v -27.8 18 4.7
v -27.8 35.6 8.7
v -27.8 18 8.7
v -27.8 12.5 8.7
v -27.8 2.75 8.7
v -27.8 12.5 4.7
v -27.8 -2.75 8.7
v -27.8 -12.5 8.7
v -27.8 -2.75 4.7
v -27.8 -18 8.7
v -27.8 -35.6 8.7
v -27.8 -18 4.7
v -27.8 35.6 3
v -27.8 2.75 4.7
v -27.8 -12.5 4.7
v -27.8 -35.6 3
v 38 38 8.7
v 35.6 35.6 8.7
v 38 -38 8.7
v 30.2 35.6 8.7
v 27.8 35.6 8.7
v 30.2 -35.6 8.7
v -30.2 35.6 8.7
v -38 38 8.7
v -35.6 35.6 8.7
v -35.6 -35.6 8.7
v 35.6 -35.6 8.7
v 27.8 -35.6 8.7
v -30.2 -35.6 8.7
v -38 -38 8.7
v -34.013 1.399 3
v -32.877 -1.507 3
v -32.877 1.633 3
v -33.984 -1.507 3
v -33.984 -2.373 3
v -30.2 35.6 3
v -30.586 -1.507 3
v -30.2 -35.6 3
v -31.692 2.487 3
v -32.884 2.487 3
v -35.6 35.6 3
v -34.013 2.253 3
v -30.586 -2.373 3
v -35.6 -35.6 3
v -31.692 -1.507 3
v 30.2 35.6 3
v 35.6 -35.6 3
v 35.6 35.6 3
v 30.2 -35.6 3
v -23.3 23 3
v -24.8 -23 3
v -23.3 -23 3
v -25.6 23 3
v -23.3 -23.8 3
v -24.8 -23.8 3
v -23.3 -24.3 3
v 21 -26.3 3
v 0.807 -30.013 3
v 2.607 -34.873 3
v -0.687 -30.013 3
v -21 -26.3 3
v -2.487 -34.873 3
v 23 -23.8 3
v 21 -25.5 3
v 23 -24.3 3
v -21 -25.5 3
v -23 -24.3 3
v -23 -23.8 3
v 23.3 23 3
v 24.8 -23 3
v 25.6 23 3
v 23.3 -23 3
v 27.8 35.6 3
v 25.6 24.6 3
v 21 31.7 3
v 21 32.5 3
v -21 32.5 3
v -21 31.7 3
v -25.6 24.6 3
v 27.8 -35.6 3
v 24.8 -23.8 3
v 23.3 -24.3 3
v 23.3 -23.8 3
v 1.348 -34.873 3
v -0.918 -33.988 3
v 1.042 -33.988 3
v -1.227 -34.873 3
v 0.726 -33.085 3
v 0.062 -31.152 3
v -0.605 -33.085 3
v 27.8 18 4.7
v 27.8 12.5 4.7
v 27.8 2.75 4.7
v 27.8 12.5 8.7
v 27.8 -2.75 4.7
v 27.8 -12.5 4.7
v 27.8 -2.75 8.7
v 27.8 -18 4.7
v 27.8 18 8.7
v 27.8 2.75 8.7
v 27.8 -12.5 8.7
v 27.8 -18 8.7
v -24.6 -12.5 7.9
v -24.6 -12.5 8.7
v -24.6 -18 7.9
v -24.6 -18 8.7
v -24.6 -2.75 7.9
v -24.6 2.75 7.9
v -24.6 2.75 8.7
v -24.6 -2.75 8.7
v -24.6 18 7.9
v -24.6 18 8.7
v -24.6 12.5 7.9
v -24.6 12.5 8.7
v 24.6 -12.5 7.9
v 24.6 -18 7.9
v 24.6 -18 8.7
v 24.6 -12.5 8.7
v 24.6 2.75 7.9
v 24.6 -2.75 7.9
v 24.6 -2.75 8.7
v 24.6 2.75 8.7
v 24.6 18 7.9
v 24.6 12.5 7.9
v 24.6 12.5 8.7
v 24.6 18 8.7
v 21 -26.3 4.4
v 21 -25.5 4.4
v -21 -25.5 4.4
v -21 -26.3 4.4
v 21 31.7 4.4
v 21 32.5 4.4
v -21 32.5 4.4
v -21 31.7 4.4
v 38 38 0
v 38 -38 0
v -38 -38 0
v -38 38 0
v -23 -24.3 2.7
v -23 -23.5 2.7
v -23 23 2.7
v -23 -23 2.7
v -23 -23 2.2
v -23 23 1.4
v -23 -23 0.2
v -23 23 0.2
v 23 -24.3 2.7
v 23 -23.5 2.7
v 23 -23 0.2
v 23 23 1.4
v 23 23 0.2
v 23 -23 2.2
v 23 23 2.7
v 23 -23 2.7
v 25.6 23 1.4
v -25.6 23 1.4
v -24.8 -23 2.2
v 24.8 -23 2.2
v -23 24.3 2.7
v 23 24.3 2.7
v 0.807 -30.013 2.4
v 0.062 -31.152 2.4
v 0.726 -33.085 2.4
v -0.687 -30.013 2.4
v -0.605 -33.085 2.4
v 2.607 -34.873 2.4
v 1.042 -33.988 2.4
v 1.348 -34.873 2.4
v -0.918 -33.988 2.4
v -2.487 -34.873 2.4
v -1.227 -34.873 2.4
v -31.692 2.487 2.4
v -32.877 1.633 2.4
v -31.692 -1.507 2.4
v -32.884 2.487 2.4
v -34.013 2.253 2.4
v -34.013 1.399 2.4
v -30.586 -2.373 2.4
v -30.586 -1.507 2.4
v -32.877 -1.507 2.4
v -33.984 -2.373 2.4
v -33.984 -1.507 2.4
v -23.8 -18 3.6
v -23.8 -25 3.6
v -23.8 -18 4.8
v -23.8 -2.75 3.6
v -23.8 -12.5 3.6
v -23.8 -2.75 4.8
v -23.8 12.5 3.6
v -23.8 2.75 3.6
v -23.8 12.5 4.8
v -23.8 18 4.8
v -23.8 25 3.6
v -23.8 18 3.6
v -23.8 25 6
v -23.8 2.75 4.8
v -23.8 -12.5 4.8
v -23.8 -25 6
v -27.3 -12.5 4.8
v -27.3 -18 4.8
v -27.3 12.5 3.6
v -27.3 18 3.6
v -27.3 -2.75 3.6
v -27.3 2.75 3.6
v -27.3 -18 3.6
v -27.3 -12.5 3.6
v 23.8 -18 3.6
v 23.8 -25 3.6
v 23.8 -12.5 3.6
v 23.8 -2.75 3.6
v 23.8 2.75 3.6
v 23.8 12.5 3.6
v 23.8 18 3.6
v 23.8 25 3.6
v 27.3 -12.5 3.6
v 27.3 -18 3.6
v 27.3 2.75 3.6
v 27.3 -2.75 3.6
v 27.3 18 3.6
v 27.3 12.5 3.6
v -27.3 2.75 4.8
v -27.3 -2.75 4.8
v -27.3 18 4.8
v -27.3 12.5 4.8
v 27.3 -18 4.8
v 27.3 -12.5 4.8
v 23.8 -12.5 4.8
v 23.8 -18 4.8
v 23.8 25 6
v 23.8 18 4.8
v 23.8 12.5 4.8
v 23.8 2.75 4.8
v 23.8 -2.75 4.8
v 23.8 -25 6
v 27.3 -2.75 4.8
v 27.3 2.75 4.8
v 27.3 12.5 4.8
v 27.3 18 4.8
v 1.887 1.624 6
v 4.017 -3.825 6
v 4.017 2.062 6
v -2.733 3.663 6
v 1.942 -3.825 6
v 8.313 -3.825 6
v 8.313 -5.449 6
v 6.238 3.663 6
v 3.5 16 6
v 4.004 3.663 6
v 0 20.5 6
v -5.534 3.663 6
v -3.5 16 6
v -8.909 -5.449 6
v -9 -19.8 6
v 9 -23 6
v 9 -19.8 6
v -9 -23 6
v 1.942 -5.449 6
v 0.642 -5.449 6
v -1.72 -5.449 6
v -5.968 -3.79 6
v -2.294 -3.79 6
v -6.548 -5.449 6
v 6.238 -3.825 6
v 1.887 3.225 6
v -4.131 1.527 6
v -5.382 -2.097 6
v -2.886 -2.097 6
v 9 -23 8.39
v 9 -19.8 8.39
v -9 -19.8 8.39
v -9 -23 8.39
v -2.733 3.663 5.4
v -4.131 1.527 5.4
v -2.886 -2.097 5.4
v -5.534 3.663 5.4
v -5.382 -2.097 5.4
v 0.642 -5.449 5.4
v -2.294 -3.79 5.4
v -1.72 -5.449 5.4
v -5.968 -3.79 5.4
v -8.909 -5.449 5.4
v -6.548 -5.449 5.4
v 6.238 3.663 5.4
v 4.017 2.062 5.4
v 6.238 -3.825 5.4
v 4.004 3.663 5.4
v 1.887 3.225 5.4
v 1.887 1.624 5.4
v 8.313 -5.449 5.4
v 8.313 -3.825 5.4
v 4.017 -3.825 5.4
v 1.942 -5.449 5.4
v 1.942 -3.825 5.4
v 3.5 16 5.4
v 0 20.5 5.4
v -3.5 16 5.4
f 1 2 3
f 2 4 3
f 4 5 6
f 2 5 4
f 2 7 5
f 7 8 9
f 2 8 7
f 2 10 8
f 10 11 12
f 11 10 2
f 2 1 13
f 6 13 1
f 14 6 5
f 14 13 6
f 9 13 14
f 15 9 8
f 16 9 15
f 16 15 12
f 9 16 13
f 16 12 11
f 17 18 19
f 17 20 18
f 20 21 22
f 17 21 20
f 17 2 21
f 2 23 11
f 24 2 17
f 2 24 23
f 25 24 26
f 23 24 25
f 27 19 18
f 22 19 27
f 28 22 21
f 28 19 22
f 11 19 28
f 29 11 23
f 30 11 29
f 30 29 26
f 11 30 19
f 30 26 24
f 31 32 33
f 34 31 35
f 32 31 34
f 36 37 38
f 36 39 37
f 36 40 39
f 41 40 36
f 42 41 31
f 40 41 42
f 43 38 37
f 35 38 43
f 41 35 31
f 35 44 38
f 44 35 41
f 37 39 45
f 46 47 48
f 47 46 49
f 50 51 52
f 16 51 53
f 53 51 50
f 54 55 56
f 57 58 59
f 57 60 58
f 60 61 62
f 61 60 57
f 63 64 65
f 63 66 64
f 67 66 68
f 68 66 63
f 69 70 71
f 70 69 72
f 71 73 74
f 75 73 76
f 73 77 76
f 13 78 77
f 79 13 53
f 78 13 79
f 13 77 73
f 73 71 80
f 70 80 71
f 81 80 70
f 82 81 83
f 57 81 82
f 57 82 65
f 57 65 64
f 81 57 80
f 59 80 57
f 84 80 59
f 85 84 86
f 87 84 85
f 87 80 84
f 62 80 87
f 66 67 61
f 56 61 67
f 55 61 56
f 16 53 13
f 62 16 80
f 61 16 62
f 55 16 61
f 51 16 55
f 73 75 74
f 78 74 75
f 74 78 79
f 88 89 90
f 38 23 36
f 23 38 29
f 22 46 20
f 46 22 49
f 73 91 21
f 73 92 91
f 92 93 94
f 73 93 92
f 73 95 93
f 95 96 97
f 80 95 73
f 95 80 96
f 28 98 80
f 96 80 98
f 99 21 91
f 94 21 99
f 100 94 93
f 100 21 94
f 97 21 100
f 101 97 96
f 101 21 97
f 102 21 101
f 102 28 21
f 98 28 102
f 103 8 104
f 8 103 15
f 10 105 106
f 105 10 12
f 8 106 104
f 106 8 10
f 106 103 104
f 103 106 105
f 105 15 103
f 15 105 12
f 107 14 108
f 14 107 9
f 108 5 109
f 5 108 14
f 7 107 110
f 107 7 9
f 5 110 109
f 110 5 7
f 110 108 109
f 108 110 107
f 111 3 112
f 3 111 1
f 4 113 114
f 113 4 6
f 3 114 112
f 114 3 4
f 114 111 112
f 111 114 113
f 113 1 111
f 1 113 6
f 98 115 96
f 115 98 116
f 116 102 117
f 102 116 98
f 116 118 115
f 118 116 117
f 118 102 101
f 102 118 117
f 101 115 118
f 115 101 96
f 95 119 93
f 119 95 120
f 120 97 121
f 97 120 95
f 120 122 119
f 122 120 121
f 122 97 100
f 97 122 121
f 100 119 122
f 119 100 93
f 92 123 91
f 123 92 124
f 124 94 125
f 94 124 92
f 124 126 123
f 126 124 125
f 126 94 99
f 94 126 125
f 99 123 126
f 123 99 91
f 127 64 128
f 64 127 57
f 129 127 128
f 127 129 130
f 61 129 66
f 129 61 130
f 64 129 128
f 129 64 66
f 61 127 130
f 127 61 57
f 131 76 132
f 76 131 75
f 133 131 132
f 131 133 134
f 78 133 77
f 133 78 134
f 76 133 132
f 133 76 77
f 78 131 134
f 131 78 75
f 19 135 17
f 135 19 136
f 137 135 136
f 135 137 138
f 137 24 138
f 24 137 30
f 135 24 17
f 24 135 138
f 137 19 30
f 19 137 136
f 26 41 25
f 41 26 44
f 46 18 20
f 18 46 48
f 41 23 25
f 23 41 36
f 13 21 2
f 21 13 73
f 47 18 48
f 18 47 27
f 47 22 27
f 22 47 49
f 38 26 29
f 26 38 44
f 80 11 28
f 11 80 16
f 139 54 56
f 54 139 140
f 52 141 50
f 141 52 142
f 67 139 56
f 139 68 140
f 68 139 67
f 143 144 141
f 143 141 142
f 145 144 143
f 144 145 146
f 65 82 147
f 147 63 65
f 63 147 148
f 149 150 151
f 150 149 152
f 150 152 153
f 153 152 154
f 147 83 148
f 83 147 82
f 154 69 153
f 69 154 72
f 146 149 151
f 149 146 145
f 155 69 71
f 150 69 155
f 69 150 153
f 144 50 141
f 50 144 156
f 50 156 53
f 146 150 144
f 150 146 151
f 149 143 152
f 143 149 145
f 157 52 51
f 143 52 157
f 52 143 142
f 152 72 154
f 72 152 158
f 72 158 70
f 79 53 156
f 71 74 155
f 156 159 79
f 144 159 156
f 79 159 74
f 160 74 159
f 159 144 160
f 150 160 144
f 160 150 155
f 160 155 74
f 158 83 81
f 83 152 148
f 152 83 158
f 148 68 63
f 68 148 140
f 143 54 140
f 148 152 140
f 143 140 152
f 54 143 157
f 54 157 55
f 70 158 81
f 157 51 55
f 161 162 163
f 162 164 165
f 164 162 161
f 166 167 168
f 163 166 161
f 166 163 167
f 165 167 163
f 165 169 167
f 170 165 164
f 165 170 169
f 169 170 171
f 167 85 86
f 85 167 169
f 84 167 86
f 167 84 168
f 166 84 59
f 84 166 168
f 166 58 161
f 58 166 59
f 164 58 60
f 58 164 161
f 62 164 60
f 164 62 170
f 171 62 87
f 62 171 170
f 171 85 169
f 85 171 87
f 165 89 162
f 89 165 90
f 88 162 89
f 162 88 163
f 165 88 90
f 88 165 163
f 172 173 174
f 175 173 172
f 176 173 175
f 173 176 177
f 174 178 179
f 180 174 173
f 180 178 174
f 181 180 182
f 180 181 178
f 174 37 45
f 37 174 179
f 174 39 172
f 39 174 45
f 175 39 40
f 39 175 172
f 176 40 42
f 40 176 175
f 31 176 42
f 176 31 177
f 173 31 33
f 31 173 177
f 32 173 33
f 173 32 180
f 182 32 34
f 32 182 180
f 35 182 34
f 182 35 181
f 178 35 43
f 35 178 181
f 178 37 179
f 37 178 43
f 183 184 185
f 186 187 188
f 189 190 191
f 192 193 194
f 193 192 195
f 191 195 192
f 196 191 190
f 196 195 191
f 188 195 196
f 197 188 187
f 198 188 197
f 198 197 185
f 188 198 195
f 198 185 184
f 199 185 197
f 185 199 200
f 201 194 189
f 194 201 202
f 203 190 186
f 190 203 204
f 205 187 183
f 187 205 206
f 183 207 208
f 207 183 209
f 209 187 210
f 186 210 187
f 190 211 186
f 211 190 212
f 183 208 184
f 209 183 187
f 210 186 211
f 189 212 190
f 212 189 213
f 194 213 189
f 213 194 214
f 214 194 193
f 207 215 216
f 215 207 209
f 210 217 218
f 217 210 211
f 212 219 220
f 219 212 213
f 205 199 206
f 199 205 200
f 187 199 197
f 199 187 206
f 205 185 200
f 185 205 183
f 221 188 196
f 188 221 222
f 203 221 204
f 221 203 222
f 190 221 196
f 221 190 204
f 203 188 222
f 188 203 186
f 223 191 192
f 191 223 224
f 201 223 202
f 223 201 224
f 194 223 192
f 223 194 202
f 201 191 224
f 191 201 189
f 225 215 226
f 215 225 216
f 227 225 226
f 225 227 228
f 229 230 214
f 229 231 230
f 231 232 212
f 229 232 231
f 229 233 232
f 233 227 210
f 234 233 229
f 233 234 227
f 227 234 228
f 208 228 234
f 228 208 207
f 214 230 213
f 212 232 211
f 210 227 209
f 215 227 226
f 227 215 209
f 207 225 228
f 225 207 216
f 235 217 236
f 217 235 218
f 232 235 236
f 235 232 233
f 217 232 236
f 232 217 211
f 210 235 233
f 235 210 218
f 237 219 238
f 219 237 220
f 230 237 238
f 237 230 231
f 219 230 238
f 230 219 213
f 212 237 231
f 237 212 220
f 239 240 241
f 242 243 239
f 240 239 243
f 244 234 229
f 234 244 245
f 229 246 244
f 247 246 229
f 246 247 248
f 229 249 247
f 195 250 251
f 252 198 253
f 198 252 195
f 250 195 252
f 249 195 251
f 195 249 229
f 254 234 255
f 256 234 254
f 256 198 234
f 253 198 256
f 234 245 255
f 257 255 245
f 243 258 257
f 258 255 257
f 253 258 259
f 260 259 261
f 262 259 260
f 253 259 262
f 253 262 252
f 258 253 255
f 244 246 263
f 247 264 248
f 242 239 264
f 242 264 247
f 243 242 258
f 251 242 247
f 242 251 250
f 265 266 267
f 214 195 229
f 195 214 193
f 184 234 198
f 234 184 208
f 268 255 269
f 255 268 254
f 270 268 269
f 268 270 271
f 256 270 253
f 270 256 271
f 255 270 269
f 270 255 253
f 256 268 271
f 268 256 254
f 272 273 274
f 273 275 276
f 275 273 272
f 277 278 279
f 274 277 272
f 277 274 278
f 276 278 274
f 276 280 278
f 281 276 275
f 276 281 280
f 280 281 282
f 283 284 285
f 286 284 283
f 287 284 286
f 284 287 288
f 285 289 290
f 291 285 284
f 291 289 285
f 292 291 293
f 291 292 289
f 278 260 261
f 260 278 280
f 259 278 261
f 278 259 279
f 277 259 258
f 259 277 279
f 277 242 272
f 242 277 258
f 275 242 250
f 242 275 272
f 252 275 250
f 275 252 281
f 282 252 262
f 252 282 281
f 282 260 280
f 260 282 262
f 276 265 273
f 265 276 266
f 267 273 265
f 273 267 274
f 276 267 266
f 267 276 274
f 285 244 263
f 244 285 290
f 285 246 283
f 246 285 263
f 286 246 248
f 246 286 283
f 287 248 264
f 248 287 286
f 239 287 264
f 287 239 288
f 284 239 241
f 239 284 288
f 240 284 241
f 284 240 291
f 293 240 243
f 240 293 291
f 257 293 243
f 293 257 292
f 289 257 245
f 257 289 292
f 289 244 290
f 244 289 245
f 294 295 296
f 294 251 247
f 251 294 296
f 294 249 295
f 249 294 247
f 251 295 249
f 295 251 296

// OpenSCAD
// Single-cell test coupon (PRINT THIS FIRST): the full production lid
// at grid 1x1 - one complete door with its rails, castellated lips,
// end-stop ridges, sacrificial membrane and per-edge window chamfers,
// straight from the production modules (nothing copied). ~30-45 min
// print. Tune door_fit here in +-0.1 steps before committing to the
// full board; see NOTES.md "Print this first".
include <sushi-battleship.scad>
grid_x = 1;
grid_y = 1;
part = "top";
